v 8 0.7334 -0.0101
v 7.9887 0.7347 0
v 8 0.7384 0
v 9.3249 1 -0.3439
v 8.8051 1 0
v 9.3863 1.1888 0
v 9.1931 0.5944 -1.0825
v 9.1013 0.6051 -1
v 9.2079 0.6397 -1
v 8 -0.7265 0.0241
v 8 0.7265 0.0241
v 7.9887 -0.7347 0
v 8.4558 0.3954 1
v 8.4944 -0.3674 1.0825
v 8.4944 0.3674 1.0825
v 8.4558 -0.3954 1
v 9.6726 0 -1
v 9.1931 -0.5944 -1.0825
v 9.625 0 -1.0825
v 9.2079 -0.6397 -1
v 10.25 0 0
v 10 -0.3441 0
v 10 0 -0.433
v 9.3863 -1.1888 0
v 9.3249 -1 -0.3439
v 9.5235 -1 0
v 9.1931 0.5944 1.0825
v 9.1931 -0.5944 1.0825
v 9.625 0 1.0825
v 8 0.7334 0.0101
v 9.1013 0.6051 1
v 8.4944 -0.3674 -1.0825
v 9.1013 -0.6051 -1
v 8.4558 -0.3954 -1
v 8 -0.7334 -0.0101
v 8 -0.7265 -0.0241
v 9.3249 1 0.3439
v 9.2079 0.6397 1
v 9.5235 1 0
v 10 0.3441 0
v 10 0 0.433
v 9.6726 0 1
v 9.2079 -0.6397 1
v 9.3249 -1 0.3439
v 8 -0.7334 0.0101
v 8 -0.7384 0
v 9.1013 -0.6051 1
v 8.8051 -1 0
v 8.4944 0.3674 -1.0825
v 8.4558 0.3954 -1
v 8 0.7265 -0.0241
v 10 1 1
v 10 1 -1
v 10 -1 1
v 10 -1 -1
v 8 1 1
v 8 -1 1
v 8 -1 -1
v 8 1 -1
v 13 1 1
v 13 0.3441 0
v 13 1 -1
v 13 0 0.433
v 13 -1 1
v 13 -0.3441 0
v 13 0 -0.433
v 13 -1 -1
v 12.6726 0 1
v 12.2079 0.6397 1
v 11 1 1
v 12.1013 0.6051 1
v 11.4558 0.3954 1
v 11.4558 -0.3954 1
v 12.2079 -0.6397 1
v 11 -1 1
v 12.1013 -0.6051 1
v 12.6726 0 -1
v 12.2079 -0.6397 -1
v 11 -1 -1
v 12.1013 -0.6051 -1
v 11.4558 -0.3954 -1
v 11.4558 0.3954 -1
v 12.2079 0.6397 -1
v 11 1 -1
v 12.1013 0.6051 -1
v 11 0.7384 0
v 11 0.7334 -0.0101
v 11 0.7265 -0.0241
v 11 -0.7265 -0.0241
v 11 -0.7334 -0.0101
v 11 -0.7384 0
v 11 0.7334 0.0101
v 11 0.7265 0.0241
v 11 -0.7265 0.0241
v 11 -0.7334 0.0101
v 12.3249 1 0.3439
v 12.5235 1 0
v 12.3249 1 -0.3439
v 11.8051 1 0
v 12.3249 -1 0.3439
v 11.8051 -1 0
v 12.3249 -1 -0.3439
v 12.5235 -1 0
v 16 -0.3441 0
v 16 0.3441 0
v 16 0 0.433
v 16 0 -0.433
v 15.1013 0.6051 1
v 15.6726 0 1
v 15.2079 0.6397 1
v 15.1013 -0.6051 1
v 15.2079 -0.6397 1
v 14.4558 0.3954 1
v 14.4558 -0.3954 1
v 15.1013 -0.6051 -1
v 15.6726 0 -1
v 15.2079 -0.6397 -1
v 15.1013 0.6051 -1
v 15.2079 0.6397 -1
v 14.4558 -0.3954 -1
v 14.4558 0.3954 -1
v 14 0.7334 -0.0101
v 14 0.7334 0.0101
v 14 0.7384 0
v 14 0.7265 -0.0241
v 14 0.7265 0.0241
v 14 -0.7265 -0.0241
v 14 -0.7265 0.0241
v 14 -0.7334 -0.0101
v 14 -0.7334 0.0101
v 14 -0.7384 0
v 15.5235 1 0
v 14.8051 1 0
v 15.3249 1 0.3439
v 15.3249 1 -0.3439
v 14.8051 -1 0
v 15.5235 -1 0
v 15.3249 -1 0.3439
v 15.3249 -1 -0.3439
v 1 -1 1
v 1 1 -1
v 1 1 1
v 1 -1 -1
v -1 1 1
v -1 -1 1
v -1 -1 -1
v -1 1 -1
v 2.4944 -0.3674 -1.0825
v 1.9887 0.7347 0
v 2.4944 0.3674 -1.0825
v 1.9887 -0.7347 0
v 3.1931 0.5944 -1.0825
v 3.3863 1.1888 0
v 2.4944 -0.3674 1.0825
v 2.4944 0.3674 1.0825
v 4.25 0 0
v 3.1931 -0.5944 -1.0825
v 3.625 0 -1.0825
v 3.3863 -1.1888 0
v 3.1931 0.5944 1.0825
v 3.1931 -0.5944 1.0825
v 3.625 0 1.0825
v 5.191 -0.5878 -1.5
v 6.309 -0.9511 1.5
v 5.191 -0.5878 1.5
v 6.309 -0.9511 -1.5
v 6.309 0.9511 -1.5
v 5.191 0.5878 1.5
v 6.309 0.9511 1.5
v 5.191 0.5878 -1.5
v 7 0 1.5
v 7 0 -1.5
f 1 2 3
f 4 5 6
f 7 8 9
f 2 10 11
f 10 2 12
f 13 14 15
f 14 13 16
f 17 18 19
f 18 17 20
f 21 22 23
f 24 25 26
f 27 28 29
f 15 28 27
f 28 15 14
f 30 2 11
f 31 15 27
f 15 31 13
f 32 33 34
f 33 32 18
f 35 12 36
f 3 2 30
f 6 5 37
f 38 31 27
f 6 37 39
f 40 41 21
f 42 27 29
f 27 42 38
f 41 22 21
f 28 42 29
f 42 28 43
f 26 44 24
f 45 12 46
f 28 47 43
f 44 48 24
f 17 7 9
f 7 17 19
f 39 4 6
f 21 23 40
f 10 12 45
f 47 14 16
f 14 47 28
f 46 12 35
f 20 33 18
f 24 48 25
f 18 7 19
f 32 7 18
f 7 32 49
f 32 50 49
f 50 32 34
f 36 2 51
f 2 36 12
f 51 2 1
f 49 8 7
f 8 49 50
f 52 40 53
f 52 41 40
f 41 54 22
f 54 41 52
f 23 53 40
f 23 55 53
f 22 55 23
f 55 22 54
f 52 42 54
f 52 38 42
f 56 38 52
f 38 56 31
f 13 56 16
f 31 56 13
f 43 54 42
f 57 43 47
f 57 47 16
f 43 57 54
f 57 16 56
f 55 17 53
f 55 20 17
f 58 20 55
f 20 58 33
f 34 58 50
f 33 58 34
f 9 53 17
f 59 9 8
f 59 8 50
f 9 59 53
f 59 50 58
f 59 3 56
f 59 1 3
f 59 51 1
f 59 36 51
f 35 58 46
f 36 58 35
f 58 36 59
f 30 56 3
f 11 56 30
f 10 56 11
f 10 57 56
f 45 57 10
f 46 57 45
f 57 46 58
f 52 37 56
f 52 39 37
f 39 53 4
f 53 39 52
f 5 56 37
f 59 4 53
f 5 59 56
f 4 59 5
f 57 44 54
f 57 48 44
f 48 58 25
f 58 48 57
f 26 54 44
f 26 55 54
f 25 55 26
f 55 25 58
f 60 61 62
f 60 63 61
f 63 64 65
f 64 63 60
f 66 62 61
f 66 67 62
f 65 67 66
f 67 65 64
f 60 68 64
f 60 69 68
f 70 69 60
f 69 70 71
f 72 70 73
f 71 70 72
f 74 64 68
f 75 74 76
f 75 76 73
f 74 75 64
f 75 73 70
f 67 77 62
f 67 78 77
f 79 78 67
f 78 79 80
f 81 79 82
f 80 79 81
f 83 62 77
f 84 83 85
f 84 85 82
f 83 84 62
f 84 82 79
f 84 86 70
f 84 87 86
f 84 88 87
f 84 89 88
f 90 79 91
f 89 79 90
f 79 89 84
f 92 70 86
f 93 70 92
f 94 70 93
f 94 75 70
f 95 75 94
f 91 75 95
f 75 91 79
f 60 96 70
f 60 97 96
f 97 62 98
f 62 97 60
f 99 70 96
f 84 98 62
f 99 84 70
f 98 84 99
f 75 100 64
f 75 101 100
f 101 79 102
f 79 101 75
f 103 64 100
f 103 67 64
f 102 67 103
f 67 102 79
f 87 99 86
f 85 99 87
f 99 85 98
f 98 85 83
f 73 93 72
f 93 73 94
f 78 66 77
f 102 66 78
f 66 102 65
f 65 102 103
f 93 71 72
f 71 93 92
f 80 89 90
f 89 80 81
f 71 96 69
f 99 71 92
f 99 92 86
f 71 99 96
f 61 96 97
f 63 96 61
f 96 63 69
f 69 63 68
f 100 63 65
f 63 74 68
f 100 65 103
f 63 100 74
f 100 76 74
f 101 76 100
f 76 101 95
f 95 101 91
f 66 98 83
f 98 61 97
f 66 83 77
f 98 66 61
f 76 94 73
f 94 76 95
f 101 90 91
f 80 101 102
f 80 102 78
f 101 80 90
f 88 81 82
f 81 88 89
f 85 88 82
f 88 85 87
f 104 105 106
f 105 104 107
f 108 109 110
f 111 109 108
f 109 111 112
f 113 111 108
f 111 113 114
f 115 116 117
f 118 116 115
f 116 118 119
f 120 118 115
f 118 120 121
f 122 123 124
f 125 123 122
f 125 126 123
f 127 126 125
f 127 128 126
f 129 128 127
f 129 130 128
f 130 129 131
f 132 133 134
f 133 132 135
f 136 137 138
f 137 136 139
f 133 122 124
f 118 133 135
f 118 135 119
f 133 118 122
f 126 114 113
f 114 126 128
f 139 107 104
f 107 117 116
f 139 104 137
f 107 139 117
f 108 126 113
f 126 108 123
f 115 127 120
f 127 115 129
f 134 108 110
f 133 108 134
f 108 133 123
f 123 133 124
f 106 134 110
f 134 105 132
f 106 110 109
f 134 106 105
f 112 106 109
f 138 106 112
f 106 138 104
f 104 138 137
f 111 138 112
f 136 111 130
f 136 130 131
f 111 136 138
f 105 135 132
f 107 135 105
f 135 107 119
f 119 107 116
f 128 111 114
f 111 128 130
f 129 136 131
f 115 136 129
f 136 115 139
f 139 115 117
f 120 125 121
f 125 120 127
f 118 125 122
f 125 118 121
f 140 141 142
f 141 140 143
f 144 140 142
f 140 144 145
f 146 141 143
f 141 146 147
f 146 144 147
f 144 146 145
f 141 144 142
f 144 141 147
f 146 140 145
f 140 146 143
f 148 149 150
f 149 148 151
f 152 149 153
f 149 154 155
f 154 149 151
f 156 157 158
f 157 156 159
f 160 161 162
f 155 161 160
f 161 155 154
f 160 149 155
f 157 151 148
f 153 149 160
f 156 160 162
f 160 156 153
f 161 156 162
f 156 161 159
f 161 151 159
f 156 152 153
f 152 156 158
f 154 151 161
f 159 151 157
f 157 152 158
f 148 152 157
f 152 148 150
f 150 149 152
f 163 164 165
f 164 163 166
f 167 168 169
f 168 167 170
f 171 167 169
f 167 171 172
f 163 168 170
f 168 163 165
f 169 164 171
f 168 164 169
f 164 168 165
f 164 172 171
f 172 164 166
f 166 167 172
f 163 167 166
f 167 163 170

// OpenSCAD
cube(2, center=true);

translate(v = [3, 0, 0]) {
    sphere(1.25);
};

translate(v = [6, 0, 0]) {
    cylinder(h = 3, center=true);
};

translate(v = [9, 0, 0]) union() {
    sphere(1.25);
    cube(2, center=true);
};

translate(v = [12, 0, 0]) difference() {
    cube(2, center=true);
    sphere(1.25);
};

translate(v = [15, 0, 0]) intersection() {
    cube(2, center=true);
    sphere(1.25);
};

translate(v = [18, 0, 0]) difference() {
    intersection() {
        cube(2, center=true);
        sphere(1.25);
    };
    rotate(a = [90,0,0]) {
        cylinder(h = 3, center=true);
    };
    rotate(a = [0,90,0]) {
        cylinder(h = 3, center=true);
    };
    cylinder(h = 3, center=true);
};
